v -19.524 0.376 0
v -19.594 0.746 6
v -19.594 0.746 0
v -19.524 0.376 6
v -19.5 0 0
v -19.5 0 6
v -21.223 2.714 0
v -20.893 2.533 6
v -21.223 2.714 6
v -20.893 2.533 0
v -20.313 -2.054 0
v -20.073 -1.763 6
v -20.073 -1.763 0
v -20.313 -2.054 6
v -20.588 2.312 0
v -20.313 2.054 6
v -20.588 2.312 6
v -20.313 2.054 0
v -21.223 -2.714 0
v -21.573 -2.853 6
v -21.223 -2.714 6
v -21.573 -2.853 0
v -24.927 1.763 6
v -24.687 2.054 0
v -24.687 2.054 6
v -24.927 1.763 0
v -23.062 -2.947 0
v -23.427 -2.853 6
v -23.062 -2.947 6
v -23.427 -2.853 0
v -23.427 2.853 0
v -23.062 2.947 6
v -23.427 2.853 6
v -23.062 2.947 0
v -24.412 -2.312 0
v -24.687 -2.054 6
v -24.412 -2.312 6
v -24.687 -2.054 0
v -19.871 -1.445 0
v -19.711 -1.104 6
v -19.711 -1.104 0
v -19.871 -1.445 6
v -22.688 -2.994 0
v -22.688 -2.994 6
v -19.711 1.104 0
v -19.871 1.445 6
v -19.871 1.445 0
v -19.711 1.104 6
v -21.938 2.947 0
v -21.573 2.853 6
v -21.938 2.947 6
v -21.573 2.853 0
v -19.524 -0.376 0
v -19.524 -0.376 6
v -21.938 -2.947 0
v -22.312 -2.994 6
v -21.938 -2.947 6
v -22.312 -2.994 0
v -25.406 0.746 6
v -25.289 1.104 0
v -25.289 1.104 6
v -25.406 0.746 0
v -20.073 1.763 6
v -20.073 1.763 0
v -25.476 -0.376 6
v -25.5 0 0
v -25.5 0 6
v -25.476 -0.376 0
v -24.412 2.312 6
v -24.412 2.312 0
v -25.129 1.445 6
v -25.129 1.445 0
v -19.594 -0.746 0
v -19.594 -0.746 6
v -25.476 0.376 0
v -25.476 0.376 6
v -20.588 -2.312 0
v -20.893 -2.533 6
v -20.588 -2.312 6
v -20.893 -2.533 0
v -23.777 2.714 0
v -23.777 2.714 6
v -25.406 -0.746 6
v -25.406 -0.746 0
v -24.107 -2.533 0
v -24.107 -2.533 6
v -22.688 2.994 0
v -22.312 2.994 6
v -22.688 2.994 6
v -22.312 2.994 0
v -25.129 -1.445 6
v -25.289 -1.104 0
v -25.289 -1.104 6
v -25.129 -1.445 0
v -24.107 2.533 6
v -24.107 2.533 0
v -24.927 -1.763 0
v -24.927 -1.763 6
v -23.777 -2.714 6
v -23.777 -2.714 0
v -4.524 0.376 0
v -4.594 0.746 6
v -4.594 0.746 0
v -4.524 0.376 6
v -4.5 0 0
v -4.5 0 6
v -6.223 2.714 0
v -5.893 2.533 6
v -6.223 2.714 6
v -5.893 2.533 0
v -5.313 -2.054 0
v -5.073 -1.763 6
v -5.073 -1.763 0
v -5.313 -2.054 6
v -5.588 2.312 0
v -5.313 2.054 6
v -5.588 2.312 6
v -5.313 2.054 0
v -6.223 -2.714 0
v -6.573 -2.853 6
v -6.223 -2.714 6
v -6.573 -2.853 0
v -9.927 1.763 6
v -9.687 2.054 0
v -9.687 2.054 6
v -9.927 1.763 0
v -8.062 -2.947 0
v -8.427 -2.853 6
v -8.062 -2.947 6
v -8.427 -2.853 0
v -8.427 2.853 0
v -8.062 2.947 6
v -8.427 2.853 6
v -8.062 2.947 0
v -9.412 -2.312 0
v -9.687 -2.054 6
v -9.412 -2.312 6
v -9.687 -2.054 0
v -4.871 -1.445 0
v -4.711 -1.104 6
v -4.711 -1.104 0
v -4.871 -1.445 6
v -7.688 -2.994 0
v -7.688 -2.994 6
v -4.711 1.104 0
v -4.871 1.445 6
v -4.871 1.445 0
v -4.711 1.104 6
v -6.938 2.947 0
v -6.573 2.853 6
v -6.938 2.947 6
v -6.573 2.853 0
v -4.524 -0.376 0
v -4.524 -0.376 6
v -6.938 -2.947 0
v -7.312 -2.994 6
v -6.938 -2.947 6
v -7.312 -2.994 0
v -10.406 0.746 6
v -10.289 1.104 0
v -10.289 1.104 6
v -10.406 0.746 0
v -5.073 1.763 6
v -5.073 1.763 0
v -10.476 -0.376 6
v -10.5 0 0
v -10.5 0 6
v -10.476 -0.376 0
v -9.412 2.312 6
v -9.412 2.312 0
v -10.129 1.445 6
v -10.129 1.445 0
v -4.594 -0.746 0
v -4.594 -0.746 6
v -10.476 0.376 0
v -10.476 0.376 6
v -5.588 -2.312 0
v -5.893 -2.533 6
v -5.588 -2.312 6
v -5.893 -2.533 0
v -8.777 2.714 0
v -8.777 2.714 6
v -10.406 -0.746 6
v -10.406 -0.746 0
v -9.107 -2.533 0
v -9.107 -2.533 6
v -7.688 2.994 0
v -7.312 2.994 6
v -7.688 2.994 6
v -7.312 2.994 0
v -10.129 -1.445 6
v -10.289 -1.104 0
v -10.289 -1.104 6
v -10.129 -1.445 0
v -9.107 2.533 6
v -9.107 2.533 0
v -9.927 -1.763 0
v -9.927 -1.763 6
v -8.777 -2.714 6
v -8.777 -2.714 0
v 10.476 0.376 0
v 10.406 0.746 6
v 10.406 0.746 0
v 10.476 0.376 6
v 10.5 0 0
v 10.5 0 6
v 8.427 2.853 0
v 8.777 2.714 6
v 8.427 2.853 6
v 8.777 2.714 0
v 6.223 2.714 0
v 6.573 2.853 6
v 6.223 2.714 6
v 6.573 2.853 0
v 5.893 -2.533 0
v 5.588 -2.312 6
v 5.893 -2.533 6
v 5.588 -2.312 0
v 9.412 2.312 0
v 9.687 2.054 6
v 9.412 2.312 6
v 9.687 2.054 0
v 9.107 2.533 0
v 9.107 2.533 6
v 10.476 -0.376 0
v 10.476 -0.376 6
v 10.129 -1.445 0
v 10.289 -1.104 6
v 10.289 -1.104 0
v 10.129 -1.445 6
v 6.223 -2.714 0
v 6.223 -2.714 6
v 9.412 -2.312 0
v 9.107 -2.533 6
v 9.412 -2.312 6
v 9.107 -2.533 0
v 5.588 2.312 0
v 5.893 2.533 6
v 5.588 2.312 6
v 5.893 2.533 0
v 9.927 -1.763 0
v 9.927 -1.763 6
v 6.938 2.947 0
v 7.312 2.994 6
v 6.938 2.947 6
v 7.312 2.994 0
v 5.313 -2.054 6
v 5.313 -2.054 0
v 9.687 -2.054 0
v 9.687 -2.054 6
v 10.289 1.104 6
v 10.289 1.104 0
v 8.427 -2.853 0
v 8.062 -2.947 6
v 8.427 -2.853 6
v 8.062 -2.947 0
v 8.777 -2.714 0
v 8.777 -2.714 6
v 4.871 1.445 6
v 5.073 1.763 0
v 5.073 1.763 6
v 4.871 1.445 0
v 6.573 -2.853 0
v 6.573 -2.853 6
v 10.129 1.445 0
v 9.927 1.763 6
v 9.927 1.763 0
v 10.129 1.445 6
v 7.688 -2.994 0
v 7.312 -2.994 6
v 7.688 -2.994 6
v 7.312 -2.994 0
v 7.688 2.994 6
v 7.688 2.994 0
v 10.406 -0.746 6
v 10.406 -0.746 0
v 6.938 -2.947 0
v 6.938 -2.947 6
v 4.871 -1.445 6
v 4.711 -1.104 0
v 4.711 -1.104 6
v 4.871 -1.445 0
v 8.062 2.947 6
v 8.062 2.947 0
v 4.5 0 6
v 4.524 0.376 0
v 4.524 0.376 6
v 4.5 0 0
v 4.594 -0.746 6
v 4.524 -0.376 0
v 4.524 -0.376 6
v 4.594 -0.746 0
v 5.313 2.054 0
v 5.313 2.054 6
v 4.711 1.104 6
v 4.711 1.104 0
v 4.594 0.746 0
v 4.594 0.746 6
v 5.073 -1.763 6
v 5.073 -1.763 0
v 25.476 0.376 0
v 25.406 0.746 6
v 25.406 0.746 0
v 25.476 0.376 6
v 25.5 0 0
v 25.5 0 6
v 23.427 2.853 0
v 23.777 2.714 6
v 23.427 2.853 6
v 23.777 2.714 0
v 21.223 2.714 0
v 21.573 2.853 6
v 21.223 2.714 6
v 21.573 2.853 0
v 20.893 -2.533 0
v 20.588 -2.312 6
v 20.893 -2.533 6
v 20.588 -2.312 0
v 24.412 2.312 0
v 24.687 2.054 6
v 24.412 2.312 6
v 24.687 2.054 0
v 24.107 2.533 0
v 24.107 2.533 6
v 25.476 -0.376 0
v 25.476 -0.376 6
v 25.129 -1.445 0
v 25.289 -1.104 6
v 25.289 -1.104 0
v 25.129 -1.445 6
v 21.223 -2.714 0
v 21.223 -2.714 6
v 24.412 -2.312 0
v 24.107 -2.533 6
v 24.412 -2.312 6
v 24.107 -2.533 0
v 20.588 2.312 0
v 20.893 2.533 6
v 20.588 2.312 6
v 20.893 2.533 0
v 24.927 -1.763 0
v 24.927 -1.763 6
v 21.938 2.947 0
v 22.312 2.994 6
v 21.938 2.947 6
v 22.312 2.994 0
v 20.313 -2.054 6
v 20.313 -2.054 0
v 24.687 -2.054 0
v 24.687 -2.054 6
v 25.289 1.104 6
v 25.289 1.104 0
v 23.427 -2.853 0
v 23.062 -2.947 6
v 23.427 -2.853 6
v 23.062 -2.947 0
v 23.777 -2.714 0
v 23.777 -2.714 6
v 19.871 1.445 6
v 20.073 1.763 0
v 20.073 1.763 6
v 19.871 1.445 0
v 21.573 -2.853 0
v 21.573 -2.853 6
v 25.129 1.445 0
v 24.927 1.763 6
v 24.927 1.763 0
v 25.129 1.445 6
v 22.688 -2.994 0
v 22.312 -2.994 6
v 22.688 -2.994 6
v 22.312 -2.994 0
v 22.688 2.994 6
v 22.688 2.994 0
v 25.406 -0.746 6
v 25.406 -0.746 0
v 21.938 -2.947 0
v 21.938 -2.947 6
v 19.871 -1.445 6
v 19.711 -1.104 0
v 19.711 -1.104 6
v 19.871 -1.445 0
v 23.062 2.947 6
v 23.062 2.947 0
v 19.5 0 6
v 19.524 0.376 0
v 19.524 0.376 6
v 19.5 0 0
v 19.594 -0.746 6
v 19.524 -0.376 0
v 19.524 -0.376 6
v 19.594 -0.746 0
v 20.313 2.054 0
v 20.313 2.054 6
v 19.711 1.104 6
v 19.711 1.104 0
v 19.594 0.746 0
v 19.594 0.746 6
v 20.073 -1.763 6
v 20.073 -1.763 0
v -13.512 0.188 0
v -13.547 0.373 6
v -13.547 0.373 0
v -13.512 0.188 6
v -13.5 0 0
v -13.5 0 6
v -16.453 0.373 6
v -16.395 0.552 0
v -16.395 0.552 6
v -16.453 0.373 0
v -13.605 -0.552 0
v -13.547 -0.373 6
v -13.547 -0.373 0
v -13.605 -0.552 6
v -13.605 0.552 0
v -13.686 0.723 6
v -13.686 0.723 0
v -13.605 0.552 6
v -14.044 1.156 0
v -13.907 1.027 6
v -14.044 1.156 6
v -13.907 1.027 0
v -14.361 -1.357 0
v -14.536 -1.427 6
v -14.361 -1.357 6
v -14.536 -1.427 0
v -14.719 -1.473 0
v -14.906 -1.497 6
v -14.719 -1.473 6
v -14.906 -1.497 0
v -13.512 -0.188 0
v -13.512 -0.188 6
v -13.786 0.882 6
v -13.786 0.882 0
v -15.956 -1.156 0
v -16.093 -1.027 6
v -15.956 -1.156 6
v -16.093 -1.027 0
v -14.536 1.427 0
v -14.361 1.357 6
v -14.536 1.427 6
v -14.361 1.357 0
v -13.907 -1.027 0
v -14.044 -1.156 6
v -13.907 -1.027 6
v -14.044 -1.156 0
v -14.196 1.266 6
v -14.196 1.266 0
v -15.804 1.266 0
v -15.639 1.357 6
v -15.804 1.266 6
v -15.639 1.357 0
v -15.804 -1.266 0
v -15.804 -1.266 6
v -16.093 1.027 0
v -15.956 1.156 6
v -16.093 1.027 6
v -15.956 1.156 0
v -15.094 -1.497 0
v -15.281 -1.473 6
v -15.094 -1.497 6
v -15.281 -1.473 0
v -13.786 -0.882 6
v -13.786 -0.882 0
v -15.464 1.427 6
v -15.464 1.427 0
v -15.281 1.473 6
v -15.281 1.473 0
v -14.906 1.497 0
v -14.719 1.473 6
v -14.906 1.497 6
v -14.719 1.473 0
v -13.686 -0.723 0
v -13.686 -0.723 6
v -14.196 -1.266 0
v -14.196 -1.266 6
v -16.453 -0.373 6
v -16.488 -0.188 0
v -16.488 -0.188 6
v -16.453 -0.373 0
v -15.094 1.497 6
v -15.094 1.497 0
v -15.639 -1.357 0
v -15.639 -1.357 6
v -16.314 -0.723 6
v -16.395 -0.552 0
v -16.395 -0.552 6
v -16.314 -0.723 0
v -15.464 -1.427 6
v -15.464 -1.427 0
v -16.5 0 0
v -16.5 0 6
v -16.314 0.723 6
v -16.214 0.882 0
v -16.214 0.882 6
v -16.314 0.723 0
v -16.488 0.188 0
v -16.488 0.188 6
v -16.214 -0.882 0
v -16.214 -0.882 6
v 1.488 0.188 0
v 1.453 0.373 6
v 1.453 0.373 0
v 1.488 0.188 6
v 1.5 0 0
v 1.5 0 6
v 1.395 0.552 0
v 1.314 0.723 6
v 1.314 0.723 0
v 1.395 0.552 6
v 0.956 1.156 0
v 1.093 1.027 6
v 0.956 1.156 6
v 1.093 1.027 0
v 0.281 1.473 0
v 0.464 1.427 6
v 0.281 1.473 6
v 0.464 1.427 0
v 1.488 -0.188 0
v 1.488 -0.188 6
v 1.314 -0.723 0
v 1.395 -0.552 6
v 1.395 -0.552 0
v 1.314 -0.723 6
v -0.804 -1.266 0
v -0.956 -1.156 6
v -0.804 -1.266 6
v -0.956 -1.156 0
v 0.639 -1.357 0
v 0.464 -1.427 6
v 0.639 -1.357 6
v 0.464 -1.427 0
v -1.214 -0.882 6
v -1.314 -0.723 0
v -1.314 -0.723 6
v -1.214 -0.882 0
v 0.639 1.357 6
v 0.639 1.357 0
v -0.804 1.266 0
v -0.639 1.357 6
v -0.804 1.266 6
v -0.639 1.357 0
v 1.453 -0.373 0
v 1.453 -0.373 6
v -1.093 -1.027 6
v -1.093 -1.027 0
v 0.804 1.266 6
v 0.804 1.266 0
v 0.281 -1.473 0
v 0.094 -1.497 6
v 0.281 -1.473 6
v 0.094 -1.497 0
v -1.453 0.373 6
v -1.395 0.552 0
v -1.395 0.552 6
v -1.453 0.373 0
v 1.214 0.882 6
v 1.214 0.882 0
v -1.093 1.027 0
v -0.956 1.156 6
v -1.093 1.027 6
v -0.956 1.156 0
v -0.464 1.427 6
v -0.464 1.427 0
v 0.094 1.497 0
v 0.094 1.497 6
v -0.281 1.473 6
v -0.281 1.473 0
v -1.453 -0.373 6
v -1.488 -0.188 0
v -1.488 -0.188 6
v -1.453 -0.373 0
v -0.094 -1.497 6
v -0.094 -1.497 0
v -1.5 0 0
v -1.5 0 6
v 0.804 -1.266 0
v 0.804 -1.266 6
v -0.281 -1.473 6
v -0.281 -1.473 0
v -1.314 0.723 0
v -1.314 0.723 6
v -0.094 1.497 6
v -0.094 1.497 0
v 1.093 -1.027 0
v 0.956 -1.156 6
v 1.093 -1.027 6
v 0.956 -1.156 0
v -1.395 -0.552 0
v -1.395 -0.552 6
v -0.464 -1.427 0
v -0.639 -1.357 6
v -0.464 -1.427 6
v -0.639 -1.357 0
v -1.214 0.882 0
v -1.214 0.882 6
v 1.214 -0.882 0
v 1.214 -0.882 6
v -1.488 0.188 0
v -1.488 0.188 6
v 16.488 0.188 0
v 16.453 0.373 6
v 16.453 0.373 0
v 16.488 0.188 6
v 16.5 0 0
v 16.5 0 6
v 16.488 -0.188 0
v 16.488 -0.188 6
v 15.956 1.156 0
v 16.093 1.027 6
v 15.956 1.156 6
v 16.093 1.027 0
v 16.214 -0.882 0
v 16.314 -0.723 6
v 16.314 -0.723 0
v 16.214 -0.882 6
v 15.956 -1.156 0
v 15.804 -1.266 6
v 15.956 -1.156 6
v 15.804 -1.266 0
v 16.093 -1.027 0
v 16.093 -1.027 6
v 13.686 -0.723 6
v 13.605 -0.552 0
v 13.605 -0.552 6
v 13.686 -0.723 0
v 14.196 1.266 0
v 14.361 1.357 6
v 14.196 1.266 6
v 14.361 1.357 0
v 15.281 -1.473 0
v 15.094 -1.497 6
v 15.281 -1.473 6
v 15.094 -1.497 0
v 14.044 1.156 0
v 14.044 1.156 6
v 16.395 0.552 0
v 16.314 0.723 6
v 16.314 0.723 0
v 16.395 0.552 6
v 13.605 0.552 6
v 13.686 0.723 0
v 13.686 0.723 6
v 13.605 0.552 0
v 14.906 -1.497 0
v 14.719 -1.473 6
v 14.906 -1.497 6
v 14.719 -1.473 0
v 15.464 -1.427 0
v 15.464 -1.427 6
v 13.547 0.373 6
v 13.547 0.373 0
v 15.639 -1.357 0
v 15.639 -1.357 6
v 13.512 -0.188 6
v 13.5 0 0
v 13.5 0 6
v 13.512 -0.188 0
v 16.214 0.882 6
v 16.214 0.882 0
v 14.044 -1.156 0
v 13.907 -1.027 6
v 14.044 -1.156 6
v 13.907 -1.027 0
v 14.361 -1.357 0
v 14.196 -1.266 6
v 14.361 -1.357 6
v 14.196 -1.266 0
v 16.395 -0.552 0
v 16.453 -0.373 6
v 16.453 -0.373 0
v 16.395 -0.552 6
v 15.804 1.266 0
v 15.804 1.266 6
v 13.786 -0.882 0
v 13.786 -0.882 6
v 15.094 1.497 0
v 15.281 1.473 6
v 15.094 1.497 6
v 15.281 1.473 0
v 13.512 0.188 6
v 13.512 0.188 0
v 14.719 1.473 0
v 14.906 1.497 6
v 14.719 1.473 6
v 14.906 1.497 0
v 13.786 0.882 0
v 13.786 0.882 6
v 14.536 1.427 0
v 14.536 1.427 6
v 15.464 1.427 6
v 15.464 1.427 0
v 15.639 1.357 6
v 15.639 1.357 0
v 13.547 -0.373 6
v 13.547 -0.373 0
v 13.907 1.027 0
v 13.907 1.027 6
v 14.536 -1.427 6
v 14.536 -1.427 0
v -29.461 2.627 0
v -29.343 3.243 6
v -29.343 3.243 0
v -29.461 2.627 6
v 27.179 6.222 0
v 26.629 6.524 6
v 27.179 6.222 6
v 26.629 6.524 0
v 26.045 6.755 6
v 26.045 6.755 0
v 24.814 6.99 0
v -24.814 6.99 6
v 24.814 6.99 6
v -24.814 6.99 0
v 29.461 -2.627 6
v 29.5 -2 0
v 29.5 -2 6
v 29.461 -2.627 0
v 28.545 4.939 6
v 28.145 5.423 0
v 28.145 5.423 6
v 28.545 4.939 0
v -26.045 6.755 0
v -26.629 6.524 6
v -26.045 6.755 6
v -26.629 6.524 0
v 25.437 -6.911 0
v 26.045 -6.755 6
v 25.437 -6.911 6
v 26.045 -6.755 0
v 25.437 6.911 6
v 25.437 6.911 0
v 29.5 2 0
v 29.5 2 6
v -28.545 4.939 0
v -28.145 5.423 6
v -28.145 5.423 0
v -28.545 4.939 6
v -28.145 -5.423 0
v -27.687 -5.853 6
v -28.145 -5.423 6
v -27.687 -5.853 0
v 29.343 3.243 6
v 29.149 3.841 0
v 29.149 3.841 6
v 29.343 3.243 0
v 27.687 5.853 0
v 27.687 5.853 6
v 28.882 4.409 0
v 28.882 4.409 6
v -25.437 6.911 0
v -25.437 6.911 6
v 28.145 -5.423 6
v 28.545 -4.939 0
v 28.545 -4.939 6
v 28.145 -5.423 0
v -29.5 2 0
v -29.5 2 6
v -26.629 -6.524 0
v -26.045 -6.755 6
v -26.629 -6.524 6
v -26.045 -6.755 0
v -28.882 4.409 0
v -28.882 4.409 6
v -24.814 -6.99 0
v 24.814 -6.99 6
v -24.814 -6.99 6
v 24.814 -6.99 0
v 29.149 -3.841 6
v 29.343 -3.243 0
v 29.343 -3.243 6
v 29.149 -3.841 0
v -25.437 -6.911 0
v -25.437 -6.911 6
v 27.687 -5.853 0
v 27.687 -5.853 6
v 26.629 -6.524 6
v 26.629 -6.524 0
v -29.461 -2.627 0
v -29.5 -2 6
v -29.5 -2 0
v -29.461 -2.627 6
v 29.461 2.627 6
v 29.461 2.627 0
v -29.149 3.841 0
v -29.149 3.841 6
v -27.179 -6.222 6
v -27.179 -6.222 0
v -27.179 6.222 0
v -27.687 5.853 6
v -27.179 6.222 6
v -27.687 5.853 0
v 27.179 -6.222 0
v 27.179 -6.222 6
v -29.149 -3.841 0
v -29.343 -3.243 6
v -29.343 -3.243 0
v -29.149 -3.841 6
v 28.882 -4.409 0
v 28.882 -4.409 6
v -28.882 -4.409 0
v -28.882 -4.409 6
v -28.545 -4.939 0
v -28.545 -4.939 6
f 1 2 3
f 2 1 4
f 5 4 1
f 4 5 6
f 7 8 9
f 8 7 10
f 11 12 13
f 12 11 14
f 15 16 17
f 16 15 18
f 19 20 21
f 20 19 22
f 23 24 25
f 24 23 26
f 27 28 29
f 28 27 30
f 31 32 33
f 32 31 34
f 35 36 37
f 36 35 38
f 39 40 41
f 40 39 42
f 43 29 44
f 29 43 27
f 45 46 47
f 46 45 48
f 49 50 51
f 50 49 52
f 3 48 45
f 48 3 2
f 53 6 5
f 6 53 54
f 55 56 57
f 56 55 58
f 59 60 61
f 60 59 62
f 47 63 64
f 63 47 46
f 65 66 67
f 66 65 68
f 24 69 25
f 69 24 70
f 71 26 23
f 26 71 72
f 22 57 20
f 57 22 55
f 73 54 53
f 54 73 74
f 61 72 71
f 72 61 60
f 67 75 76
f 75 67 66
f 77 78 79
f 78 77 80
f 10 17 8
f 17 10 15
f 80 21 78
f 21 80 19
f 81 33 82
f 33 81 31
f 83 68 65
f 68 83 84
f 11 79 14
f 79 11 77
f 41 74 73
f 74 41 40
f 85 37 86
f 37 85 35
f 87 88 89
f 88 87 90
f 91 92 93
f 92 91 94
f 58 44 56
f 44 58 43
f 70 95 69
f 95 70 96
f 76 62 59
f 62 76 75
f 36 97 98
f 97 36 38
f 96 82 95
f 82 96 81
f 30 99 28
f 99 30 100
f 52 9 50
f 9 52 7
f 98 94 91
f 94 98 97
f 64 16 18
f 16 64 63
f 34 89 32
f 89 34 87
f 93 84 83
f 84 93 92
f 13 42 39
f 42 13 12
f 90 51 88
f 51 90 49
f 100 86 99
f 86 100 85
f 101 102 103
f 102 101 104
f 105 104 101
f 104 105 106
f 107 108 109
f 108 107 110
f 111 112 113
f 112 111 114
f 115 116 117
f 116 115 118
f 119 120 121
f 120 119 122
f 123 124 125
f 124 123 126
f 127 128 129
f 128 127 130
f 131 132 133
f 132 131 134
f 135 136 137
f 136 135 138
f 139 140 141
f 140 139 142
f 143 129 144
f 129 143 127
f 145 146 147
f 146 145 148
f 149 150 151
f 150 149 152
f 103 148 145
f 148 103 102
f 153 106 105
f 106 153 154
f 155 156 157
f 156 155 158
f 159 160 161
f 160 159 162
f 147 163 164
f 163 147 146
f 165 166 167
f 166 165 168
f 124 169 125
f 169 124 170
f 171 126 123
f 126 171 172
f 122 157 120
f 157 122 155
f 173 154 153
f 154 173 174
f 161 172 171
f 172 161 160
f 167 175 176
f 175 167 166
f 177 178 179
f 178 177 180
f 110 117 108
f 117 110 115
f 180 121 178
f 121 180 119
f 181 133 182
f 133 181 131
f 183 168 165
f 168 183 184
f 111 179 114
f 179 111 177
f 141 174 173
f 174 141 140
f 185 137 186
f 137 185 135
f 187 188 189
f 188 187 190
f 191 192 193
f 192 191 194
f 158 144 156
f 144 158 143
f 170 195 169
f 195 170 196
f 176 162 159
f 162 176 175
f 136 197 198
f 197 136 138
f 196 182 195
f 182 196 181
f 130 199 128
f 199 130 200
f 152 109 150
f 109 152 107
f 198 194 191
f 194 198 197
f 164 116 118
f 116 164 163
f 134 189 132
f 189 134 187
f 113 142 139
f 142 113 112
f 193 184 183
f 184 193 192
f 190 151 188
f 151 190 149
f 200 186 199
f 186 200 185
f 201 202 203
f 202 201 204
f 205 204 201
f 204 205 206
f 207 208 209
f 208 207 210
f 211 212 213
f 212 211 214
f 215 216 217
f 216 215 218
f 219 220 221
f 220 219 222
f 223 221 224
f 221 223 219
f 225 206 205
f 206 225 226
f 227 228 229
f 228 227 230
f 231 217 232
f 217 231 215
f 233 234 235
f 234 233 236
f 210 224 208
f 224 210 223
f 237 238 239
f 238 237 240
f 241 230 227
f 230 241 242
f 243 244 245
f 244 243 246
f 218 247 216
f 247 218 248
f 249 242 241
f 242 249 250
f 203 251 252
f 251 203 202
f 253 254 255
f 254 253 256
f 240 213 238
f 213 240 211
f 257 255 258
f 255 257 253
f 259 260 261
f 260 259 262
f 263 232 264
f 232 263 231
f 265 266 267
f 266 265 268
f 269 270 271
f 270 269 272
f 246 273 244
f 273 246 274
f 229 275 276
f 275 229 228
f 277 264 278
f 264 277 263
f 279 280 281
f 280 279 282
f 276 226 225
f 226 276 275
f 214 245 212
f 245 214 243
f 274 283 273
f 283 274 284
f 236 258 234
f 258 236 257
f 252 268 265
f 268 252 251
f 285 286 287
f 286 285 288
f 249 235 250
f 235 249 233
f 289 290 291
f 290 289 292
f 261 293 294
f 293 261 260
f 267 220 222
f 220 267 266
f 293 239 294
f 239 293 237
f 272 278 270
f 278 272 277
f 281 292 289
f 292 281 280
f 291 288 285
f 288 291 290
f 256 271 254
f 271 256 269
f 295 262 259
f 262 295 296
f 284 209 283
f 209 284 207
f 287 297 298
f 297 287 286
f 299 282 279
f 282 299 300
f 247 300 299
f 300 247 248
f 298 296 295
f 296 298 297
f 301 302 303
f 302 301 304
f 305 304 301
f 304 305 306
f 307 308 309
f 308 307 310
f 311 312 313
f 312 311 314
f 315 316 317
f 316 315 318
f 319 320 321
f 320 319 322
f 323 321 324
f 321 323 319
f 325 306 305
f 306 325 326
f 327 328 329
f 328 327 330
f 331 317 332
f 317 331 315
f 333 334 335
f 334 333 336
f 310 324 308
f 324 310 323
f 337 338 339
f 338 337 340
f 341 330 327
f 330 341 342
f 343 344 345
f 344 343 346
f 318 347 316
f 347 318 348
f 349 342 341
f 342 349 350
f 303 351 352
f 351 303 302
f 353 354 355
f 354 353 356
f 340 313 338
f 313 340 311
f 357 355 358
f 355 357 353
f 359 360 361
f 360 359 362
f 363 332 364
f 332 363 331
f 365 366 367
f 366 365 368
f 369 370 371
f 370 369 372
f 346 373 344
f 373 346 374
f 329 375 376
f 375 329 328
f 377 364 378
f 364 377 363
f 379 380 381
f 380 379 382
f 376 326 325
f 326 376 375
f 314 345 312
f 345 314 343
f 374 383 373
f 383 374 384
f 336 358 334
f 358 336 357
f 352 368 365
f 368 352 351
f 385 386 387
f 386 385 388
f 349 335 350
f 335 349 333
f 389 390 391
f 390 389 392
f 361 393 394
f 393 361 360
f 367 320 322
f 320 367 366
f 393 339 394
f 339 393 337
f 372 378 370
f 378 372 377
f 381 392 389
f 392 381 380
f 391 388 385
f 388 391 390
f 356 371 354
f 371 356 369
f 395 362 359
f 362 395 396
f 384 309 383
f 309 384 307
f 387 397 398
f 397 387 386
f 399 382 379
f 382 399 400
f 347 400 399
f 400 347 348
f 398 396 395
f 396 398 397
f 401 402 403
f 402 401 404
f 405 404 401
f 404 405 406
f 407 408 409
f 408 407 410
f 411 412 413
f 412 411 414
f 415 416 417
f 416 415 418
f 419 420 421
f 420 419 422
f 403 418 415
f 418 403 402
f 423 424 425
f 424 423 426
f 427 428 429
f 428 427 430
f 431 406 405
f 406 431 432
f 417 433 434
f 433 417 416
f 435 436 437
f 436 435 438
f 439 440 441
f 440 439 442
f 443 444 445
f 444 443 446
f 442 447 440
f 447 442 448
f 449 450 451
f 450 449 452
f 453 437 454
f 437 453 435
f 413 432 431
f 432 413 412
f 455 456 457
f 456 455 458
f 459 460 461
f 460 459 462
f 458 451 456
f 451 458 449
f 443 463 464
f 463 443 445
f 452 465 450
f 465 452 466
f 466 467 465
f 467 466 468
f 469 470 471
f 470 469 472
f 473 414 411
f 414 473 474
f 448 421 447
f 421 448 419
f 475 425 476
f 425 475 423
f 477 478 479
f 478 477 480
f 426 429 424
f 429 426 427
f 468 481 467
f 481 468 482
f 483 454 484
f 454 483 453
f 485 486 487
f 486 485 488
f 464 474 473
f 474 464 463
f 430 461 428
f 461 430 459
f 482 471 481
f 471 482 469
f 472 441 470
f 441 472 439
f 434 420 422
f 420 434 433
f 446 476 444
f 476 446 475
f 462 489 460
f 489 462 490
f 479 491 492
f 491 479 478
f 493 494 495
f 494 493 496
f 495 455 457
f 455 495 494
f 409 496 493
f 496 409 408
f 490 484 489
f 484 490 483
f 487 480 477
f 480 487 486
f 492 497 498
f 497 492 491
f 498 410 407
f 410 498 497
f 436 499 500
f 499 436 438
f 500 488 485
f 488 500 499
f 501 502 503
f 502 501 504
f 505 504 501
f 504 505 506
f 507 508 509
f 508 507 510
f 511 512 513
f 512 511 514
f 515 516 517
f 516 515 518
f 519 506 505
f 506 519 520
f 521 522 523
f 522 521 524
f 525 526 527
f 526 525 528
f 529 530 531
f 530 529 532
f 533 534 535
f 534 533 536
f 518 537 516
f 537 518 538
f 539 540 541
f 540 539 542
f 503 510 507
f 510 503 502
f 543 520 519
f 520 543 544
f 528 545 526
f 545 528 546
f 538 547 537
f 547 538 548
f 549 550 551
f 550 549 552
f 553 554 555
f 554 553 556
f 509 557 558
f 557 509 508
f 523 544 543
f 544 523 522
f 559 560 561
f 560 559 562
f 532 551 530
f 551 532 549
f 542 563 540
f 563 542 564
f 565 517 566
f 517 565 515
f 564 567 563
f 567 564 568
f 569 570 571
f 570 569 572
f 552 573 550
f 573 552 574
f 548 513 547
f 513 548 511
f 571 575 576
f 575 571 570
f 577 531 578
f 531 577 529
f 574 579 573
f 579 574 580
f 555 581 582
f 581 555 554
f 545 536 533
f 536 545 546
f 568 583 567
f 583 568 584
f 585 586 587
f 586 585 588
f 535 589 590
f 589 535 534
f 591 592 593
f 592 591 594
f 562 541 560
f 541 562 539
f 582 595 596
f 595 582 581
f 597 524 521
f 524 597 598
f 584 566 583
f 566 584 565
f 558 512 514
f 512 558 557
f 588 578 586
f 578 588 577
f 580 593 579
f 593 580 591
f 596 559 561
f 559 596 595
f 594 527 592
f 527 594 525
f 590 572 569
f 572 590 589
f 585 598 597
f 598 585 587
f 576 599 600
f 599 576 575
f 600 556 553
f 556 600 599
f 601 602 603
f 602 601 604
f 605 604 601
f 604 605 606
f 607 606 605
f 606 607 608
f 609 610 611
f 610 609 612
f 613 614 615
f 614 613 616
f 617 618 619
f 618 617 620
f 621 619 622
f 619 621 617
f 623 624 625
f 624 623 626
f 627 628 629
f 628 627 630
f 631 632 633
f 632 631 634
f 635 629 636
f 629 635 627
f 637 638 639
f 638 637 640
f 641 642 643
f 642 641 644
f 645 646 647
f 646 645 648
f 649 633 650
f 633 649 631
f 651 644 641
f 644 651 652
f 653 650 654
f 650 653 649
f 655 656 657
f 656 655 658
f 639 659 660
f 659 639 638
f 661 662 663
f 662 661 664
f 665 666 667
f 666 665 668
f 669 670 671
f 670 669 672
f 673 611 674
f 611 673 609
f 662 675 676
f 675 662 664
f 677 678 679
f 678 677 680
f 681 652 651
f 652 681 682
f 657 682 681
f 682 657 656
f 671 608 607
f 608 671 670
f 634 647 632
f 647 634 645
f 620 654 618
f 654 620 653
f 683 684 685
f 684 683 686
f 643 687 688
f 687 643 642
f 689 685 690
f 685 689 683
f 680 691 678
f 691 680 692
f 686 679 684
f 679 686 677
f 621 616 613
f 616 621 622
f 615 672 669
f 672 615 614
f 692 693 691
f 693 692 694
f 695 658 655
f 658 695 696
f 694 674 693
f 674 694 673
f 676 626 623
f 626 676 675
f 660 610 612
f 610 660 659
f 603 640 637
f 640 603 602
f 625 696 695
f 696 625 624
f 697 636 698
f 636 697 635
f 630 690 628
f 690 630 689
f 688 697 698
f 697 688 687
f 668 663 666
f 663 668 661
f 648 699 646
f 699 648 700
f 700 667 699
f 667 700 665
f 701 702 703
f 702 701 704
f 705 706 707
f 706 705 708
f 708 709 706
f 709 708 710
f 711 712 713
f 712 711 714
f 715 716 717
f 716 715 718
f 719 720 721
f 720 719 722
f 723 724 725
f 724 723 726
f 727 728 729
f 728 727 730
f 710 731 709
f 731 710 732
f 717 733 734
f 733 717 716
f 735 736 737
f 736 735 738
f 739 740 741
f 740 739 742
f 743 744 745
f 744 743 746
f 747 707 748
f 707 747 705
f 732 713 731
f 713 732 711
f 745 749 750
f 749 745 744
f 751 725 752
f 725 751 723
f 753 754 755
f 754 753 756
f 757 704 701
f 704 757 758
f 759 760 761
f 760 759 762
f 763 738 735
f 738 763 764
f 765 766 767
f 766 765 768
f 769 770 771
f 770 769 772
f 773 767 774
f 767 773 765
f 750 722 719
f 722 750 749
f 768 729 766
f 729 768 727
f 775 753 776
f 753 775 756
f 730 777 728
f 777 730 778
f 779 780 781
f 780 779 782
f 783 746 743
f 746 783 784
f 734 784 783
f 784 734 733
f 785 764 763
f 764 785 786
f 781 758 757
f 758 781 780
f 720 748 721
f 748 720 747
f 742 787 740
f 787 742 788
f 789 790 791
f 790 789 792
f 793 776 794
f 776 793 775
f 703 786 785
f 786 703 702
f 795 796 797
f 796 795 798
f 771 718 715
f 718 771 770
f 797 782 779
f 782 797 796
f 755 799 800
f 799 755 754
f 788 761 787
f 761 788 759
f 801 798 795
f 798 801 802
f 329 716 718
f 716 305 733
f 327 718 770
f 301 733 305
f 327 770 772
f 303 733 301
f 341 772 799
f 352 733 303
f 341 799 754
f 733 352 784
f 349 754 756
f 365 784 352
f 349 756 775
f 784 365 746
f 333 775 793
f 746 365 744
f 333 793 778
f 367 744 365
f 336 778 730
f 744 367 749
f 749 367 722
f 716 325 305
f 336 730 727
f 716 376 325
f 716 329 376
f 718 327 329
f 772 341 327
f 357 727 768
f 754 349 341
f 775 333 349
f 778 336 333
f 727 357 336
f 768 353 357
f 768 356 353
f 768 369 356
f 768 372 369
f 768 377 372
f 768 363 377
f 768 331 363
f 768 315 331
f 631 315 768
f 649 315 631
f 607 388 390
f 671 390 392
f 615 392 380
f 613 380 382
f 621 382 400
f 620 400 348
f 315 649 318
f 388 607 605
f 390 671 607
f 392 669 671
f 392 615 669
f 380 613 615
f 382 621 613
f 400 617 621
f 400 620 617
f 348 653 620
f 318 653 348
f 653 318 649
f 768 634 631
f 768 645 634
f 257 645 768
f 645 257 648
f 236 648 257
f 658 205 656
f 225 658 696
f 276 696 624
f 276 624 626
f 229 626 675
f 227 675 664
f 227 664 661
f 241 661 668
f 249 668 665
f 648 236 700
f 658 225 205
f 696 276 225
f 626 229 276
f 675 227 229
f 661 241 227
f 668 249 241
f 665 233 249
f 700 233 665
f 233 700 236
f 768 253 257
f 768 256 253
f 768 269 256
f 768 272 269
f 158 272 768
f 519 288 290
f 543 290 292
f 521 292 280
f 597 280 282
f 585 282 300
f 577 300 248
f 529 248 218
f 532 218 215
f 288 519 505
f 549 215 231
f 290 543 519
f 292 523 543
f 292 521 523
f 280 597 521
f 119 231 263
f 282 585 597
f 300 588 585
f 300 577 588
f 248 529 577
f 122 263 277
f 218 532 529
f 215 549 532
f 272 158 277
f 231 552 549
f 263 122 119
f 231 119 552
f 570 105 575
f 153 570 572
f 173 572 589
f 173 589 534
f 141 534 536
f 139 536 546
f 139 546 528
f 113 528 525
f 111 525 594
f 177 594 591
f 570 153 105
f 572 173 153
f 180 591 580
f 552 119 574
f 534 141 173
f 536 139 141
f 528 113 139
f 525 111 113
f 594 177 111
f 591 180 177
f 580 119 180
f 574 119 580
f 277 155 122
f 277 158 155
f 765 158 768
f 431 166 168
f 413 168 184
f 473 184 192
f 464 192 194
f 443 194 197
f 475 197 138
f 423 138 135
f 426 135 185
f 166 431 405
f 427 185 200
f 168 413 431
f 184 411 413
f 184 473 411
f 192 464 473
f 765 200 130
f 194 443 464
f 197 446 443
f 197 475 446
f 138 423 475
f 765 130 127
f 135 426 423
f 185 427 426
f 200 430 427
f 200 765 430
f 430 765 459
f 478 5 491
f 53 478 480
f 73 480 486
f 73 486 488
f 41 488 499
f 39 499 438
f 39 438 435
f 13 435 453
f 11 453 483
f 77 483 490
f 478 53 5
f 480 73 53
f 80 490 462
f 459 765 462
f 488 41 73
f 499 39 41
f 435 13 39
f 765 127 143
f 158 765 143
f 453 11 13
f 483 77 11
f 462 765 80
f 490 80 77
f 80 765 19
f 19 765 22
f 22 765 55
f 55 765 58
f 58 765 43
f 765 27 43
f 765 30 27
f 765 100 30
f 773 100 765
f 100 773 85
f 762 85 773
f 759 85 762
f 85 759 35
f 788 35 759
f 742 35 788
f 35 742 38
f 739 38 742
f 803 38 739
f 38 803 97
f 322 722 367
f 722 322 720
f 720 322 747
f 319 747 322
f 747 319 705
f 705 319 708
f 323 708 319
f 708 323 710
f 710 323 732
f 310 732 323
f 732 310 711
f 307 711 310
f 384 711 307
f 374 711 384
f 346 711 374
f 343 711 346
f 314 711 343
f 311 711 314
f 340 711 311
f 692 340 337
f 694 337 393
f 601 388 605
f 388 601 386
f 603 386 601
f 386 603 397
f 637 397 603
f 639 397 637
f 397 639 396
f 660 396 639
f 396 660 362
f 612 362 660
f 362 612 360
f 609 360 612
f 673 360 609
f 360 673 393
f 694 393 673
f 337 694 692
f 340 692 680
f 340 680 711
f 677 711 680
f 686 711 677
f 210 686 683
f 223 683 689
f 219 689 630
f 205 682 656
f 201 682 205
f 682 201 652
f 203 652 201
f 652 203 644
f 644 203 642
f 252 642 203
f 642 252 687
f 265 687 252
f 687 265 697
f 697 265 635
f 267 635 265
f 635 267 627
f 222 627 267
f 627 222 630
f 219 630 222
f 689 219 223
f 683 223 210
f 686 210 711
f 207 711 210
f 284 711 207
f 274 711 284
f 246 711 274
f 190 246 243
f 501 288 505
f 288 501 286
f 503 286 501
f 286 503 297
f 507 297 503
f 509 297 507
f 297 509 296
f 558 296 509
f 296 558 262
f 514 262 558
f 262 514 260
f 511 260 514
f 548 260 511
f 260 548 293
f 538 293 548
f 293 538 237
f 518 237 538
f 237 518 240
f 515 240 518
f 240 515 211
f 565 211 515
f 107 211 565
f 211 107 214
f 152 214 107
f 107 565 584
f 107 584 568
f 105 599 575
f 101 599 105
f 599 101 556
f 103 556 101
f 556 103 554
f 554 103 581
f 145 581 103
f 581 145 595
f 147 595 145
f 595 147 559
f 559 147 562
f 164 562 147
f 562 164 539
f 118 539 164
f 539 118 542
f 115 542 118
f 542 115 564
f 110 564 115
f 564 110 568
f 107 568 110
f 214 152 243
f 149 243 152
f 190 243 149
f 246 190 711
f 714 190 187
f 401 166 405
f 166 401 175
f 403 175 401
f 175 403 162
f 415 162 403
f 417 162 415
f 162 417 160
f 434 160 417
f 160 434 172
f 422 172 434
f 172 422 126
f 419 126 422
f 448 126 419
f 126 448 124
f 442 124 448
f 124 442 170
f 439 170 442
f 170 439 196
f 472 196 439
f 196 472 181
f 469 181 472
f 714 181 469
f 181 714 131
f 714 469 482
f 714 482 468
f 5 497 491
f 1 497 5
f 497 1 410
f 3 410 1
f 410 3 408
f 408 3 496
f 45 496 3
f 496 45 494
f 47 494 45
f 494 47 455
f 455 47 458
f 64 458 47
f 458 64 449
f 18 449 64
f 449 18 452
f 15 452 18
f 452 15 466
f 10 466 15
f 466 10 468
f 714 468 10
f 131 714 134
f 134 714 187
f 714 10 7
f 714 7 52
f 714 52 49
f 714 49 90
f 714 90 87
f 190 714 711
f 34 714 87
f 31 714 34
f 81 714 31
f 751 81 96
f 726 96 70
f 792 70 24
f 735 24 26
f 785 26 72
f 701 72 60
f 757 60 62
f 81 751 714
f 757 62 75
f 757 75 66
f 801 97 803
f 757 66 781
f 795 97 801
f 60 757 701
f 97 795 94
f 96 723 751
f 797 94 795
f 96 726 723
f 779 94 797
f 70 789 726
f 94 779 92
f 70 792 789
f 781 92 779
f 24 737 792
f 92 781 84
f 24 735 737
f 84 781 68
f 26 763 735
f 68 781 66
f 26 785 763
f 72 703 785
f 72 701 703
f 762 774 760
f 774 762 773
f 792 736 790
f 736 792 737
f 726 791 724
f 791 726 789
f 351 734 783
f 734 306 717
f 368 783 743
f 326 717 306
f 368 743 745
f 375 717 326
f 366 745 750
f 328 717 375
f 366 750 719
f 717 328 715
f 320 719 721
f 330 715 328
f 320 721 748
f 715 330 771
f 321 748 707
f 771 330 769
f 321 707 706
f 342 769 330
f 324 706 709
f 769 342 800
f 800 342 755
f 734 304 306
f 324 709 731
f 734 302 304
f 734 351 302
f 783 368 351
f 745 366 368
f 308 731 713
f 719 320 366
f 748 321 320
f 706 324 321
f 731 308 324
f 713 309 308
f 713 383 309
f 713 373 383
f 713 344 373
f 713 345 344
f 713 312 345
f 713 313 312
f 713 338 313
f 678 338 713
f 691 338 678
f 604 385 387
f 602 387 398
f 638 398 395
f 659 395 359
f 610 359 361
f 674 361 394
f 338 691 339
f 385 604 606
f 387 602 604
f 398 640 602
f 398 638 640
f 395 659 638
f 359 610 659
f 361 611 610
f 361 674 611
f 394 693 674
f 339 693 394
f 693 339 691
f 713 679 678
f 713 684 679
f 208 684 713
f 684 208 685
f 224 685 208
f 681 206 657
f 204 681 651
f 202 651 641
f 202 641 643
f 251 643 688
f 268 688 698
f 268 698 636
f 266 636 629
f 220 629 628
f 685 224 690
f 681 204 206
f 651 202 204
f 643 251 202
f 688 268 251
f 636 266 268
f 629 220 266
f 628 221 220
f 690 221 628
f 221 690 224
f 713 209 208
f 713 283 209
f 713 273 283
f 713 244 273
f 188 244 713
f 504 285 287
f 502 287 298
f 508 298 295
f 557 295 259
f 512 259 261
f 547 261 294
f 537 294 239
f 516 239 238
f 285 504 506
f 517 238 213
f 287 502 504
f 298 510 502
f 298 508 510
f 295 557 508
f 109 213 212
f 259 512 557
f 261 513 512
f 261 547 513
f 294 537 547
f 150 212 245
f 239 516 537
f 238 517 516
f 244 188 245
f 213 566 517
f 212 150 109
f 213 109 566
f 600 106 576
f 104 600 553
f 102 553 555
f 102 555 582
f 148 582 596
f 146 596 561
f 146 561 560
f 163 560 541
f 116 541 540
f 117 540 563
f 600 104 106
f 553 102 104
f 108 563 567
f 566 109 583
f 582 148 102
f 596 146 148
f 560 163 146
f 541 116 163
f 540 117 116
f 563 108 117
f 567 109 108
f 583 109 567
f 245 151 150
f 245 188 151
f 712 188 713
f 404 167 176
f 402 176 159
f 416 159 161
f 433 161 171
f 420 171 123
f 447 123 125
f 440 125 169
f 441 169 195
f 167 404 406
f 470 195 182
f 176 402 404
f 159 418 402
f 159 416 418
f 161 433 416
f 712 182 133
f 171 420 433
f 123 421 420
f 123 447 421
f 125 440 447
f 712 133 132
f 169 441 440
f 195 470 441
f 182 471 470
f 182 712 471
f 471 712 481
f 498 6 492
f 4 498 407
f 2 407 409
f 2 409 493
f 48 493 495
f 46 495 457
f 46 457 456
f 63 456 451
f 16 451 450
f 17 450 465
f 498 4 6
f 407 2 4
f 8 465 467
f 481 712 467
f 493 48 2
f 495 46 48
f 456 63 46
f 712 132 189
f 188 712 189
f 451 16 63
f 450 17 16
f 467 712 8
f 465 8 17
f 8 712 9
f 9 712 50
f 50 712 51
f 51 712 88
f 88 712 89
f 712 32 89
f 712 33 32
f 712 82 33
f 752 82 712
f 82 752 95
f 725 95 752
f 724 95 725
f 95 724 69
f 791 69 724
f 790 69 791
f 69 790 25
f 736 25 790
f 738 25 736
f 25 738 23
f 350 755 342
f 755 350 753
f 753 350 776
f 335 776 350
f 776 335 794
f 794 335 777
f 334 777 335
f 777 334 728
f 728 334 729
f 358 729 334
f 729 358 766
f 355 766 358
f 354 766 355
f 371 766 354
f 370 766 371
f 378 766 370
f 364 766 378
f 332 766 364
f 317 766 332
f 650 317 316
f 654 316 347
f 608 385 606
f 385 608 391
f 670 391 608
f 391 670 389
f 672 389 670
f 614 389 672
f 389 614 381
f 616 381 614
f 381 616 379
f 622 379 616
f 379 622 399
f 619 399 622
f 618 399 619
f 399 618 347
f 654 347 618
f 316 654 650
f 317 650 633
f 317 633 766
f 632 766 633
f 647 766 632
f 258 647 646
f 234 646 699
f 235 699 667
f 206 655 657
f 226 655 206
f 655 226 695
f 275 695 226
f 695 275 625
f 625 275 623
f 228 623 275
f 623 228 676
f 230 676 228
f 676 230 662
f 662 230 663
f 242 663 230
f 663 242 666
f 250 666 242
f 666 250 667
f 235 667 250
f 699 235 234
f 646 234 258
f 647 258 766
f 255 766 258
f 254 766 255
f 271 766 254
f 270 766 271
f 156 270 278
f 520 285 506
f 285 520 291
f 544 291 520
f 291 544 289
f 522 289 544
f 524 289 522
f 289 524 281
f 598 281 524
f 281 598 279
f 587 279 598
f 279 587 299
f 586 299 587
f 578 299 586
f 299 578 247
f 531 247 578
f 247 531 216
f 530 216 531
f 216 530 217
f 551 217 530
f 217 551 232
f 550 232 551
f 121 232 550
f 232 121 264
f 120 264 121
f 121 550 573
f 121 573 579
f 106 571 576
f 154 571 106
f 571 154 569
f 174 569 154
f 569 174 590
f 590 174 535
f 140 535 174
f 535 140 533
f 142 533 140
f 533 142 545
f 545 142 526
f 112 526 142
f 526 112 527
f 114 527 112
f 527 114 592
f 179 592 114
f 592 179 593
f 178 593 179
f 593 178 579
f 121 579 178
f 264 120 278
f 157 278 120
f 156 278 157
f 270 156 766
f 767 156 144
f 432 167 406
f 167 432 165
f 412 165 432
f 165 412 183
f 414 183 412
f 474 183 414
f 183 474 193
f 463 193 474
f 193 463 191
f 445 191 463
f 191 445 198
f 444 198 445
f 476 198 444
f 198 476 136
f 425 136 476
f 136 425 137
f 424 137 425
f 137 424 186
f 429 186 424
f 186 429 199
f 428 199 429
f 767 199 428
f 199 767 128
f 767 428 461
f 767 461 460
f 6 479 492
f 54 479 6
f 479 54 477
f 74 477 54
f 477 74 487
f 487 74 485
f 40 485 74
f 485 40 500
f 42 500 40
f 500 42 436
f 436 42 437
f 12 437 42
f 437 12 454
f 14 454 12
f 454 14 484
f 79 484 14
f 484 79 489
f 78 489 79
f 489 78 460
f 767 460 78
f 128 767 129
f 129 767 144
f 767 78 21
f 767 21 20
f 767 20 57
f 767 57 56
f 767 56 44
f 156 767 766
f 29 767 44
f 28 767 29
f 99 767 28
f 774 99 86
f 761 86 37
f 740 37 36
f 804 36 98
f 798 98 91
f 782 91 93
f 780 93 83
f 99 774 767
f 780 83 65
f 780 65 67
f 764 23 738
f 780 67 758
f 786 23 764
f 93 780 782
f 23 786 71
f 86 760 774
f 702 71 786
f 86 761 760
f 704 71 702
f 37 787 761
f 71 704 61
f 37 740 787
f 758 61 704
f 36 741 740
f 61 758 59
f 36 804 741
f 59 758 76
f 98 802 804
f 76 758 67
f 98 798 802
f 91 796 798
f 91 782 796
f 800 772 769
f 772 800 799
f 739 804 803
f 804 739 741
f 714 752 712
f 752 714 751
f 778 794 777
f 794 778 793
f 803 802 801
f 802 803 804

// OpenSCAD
$fn = 50;


difference() {
	union() {
		*color(alpha = 1.0000000000, c = "gray") {
			translate(v = [0, 7, 0]) {
				linear_extrude(height = 1) {
					text(font = "Arial:style=Bold", halign = "center", size = 4.5000000000, text = "COMMENT plate main", valign = "center");
				}
			}
		}
		*color(alpha = 1.0000000000, c = "gray") {
			translate(v = [0, 14, 0]) {
				linear_extrude(height = 1) {
					text(font = "Arial:style=Bold", halign = "center", size = 4.5000000000, text = "COMMENT description oobb_plate_shape_p_type_6_depth_4_width_1_height_6_thickness_true_both_holes", valign = "center");
				}
			}
		}
		hull() {
			translate(v = [-24.5000000000, 2.0000000000, 0]) {
				cylinder(h = 6, r = 5);
			}
			translate(v = [24.5000000000, 2.0000000000, 0]) {
				cylinder(h = 6, r = 5);
			}
			translate(v = [-24.5000000000, -2.0000000000, 0]) {
				cylinder(h = 6, r = 5);
			}
			translate(v = [24.5000000000, -2.0000000000, 0]) {
				cylinder(h = 6, r = 5);
			}
		}
	}
	union() {
		*color(alpha = 1.0000000000, c = "gray") {
			translate(v = [0, 7, 0]) {
				linear_extrude(height = 1) {
					text(font = "Arial:style=Bold", halign = "center", size = 4.5000000000, text = "COMMENT holes main", valign = "center");
				}
			}
		}
		*color(alpha = 1.0000000000, c = "gray") {
			translate(v = [0, 14, 0]) {
				linear_extrude(height = 1) {
					text(font = "Arial:style=Bold", halign = "center", size = 4.5000000000, text = "COMMENT description oobb_holes_shape_n_type_4_width_1_height_6_thickness_true_both_holes", valign = "center");
				}
			}
		}
		translate(v = [-22.5000000000, 0.0000000000, 0]) {
			translate(v = [0, 0, -50]) {
				cylinder(h = 100, r = 3.0000000000);
			}
		}
		translate(v = [-7.5000000000, 0.0000000000, 0]) {
			translate(v = [0, 0, -50]) {
				cylinder(h = 100, r = 3.0000000000);
			}
		}
		translate(v = [7.5000000000, 0.0000000000, 0]) {
			translate(v = [0, 0, -50]) {
				cylinder(h = 100, r = 3.0000000000);
			}
		}
		translate(v = [22.5000000000, 0.0000000000, 0]) {
			translate(v = [0, 0, -50]) {
				cylinder(h = 100, r = 3.0000000000);
			}
		}
		translate(v = [-22.5000000000, 0.0000000000, 0]) {
			translate(v = [0, 0, -50]) {
				cylinder(h = 100, r = 1.5000000000);
			}
		}
		translate(v = [-15.0000000000, 0.0000000000, 0]) {
			translate(v = [0, 0, -50]) {
				cylinder(h = 100, r = 1.5000000000);
			}
		}
		translate(v = [-7.5000000000, 0.0000000000, 0]) {
			translate(v = [0, 0, -50]) {
				cylinder(h = 100, r = 1.5000000000);
			}
		}
		translate(v = [0, 0, -50]) {
			cylinder(h = 100, r = 1.5000000000);
		}
		translate(v = [7.5000000000, 0.0000000000, 0]) {
			translate(v = [0, 0, -50]) {
				cylinder(h = 100, r = 1.5000000000);
			}
		}
		translate(v = [15.0000000000, 0.0000000000, 0]) {
			translate(v = [0, 0, -50]) {
				cylinder(h = 100, r = 1.5000000000);
			}
		}
		translate(v = [22.5000000000, 0.0000000000, 0]) {
			translate(v = [0, 0, -50]) {
				cylinder(h = 100, r = 1.5000000000);
			}
		}
	}
}
